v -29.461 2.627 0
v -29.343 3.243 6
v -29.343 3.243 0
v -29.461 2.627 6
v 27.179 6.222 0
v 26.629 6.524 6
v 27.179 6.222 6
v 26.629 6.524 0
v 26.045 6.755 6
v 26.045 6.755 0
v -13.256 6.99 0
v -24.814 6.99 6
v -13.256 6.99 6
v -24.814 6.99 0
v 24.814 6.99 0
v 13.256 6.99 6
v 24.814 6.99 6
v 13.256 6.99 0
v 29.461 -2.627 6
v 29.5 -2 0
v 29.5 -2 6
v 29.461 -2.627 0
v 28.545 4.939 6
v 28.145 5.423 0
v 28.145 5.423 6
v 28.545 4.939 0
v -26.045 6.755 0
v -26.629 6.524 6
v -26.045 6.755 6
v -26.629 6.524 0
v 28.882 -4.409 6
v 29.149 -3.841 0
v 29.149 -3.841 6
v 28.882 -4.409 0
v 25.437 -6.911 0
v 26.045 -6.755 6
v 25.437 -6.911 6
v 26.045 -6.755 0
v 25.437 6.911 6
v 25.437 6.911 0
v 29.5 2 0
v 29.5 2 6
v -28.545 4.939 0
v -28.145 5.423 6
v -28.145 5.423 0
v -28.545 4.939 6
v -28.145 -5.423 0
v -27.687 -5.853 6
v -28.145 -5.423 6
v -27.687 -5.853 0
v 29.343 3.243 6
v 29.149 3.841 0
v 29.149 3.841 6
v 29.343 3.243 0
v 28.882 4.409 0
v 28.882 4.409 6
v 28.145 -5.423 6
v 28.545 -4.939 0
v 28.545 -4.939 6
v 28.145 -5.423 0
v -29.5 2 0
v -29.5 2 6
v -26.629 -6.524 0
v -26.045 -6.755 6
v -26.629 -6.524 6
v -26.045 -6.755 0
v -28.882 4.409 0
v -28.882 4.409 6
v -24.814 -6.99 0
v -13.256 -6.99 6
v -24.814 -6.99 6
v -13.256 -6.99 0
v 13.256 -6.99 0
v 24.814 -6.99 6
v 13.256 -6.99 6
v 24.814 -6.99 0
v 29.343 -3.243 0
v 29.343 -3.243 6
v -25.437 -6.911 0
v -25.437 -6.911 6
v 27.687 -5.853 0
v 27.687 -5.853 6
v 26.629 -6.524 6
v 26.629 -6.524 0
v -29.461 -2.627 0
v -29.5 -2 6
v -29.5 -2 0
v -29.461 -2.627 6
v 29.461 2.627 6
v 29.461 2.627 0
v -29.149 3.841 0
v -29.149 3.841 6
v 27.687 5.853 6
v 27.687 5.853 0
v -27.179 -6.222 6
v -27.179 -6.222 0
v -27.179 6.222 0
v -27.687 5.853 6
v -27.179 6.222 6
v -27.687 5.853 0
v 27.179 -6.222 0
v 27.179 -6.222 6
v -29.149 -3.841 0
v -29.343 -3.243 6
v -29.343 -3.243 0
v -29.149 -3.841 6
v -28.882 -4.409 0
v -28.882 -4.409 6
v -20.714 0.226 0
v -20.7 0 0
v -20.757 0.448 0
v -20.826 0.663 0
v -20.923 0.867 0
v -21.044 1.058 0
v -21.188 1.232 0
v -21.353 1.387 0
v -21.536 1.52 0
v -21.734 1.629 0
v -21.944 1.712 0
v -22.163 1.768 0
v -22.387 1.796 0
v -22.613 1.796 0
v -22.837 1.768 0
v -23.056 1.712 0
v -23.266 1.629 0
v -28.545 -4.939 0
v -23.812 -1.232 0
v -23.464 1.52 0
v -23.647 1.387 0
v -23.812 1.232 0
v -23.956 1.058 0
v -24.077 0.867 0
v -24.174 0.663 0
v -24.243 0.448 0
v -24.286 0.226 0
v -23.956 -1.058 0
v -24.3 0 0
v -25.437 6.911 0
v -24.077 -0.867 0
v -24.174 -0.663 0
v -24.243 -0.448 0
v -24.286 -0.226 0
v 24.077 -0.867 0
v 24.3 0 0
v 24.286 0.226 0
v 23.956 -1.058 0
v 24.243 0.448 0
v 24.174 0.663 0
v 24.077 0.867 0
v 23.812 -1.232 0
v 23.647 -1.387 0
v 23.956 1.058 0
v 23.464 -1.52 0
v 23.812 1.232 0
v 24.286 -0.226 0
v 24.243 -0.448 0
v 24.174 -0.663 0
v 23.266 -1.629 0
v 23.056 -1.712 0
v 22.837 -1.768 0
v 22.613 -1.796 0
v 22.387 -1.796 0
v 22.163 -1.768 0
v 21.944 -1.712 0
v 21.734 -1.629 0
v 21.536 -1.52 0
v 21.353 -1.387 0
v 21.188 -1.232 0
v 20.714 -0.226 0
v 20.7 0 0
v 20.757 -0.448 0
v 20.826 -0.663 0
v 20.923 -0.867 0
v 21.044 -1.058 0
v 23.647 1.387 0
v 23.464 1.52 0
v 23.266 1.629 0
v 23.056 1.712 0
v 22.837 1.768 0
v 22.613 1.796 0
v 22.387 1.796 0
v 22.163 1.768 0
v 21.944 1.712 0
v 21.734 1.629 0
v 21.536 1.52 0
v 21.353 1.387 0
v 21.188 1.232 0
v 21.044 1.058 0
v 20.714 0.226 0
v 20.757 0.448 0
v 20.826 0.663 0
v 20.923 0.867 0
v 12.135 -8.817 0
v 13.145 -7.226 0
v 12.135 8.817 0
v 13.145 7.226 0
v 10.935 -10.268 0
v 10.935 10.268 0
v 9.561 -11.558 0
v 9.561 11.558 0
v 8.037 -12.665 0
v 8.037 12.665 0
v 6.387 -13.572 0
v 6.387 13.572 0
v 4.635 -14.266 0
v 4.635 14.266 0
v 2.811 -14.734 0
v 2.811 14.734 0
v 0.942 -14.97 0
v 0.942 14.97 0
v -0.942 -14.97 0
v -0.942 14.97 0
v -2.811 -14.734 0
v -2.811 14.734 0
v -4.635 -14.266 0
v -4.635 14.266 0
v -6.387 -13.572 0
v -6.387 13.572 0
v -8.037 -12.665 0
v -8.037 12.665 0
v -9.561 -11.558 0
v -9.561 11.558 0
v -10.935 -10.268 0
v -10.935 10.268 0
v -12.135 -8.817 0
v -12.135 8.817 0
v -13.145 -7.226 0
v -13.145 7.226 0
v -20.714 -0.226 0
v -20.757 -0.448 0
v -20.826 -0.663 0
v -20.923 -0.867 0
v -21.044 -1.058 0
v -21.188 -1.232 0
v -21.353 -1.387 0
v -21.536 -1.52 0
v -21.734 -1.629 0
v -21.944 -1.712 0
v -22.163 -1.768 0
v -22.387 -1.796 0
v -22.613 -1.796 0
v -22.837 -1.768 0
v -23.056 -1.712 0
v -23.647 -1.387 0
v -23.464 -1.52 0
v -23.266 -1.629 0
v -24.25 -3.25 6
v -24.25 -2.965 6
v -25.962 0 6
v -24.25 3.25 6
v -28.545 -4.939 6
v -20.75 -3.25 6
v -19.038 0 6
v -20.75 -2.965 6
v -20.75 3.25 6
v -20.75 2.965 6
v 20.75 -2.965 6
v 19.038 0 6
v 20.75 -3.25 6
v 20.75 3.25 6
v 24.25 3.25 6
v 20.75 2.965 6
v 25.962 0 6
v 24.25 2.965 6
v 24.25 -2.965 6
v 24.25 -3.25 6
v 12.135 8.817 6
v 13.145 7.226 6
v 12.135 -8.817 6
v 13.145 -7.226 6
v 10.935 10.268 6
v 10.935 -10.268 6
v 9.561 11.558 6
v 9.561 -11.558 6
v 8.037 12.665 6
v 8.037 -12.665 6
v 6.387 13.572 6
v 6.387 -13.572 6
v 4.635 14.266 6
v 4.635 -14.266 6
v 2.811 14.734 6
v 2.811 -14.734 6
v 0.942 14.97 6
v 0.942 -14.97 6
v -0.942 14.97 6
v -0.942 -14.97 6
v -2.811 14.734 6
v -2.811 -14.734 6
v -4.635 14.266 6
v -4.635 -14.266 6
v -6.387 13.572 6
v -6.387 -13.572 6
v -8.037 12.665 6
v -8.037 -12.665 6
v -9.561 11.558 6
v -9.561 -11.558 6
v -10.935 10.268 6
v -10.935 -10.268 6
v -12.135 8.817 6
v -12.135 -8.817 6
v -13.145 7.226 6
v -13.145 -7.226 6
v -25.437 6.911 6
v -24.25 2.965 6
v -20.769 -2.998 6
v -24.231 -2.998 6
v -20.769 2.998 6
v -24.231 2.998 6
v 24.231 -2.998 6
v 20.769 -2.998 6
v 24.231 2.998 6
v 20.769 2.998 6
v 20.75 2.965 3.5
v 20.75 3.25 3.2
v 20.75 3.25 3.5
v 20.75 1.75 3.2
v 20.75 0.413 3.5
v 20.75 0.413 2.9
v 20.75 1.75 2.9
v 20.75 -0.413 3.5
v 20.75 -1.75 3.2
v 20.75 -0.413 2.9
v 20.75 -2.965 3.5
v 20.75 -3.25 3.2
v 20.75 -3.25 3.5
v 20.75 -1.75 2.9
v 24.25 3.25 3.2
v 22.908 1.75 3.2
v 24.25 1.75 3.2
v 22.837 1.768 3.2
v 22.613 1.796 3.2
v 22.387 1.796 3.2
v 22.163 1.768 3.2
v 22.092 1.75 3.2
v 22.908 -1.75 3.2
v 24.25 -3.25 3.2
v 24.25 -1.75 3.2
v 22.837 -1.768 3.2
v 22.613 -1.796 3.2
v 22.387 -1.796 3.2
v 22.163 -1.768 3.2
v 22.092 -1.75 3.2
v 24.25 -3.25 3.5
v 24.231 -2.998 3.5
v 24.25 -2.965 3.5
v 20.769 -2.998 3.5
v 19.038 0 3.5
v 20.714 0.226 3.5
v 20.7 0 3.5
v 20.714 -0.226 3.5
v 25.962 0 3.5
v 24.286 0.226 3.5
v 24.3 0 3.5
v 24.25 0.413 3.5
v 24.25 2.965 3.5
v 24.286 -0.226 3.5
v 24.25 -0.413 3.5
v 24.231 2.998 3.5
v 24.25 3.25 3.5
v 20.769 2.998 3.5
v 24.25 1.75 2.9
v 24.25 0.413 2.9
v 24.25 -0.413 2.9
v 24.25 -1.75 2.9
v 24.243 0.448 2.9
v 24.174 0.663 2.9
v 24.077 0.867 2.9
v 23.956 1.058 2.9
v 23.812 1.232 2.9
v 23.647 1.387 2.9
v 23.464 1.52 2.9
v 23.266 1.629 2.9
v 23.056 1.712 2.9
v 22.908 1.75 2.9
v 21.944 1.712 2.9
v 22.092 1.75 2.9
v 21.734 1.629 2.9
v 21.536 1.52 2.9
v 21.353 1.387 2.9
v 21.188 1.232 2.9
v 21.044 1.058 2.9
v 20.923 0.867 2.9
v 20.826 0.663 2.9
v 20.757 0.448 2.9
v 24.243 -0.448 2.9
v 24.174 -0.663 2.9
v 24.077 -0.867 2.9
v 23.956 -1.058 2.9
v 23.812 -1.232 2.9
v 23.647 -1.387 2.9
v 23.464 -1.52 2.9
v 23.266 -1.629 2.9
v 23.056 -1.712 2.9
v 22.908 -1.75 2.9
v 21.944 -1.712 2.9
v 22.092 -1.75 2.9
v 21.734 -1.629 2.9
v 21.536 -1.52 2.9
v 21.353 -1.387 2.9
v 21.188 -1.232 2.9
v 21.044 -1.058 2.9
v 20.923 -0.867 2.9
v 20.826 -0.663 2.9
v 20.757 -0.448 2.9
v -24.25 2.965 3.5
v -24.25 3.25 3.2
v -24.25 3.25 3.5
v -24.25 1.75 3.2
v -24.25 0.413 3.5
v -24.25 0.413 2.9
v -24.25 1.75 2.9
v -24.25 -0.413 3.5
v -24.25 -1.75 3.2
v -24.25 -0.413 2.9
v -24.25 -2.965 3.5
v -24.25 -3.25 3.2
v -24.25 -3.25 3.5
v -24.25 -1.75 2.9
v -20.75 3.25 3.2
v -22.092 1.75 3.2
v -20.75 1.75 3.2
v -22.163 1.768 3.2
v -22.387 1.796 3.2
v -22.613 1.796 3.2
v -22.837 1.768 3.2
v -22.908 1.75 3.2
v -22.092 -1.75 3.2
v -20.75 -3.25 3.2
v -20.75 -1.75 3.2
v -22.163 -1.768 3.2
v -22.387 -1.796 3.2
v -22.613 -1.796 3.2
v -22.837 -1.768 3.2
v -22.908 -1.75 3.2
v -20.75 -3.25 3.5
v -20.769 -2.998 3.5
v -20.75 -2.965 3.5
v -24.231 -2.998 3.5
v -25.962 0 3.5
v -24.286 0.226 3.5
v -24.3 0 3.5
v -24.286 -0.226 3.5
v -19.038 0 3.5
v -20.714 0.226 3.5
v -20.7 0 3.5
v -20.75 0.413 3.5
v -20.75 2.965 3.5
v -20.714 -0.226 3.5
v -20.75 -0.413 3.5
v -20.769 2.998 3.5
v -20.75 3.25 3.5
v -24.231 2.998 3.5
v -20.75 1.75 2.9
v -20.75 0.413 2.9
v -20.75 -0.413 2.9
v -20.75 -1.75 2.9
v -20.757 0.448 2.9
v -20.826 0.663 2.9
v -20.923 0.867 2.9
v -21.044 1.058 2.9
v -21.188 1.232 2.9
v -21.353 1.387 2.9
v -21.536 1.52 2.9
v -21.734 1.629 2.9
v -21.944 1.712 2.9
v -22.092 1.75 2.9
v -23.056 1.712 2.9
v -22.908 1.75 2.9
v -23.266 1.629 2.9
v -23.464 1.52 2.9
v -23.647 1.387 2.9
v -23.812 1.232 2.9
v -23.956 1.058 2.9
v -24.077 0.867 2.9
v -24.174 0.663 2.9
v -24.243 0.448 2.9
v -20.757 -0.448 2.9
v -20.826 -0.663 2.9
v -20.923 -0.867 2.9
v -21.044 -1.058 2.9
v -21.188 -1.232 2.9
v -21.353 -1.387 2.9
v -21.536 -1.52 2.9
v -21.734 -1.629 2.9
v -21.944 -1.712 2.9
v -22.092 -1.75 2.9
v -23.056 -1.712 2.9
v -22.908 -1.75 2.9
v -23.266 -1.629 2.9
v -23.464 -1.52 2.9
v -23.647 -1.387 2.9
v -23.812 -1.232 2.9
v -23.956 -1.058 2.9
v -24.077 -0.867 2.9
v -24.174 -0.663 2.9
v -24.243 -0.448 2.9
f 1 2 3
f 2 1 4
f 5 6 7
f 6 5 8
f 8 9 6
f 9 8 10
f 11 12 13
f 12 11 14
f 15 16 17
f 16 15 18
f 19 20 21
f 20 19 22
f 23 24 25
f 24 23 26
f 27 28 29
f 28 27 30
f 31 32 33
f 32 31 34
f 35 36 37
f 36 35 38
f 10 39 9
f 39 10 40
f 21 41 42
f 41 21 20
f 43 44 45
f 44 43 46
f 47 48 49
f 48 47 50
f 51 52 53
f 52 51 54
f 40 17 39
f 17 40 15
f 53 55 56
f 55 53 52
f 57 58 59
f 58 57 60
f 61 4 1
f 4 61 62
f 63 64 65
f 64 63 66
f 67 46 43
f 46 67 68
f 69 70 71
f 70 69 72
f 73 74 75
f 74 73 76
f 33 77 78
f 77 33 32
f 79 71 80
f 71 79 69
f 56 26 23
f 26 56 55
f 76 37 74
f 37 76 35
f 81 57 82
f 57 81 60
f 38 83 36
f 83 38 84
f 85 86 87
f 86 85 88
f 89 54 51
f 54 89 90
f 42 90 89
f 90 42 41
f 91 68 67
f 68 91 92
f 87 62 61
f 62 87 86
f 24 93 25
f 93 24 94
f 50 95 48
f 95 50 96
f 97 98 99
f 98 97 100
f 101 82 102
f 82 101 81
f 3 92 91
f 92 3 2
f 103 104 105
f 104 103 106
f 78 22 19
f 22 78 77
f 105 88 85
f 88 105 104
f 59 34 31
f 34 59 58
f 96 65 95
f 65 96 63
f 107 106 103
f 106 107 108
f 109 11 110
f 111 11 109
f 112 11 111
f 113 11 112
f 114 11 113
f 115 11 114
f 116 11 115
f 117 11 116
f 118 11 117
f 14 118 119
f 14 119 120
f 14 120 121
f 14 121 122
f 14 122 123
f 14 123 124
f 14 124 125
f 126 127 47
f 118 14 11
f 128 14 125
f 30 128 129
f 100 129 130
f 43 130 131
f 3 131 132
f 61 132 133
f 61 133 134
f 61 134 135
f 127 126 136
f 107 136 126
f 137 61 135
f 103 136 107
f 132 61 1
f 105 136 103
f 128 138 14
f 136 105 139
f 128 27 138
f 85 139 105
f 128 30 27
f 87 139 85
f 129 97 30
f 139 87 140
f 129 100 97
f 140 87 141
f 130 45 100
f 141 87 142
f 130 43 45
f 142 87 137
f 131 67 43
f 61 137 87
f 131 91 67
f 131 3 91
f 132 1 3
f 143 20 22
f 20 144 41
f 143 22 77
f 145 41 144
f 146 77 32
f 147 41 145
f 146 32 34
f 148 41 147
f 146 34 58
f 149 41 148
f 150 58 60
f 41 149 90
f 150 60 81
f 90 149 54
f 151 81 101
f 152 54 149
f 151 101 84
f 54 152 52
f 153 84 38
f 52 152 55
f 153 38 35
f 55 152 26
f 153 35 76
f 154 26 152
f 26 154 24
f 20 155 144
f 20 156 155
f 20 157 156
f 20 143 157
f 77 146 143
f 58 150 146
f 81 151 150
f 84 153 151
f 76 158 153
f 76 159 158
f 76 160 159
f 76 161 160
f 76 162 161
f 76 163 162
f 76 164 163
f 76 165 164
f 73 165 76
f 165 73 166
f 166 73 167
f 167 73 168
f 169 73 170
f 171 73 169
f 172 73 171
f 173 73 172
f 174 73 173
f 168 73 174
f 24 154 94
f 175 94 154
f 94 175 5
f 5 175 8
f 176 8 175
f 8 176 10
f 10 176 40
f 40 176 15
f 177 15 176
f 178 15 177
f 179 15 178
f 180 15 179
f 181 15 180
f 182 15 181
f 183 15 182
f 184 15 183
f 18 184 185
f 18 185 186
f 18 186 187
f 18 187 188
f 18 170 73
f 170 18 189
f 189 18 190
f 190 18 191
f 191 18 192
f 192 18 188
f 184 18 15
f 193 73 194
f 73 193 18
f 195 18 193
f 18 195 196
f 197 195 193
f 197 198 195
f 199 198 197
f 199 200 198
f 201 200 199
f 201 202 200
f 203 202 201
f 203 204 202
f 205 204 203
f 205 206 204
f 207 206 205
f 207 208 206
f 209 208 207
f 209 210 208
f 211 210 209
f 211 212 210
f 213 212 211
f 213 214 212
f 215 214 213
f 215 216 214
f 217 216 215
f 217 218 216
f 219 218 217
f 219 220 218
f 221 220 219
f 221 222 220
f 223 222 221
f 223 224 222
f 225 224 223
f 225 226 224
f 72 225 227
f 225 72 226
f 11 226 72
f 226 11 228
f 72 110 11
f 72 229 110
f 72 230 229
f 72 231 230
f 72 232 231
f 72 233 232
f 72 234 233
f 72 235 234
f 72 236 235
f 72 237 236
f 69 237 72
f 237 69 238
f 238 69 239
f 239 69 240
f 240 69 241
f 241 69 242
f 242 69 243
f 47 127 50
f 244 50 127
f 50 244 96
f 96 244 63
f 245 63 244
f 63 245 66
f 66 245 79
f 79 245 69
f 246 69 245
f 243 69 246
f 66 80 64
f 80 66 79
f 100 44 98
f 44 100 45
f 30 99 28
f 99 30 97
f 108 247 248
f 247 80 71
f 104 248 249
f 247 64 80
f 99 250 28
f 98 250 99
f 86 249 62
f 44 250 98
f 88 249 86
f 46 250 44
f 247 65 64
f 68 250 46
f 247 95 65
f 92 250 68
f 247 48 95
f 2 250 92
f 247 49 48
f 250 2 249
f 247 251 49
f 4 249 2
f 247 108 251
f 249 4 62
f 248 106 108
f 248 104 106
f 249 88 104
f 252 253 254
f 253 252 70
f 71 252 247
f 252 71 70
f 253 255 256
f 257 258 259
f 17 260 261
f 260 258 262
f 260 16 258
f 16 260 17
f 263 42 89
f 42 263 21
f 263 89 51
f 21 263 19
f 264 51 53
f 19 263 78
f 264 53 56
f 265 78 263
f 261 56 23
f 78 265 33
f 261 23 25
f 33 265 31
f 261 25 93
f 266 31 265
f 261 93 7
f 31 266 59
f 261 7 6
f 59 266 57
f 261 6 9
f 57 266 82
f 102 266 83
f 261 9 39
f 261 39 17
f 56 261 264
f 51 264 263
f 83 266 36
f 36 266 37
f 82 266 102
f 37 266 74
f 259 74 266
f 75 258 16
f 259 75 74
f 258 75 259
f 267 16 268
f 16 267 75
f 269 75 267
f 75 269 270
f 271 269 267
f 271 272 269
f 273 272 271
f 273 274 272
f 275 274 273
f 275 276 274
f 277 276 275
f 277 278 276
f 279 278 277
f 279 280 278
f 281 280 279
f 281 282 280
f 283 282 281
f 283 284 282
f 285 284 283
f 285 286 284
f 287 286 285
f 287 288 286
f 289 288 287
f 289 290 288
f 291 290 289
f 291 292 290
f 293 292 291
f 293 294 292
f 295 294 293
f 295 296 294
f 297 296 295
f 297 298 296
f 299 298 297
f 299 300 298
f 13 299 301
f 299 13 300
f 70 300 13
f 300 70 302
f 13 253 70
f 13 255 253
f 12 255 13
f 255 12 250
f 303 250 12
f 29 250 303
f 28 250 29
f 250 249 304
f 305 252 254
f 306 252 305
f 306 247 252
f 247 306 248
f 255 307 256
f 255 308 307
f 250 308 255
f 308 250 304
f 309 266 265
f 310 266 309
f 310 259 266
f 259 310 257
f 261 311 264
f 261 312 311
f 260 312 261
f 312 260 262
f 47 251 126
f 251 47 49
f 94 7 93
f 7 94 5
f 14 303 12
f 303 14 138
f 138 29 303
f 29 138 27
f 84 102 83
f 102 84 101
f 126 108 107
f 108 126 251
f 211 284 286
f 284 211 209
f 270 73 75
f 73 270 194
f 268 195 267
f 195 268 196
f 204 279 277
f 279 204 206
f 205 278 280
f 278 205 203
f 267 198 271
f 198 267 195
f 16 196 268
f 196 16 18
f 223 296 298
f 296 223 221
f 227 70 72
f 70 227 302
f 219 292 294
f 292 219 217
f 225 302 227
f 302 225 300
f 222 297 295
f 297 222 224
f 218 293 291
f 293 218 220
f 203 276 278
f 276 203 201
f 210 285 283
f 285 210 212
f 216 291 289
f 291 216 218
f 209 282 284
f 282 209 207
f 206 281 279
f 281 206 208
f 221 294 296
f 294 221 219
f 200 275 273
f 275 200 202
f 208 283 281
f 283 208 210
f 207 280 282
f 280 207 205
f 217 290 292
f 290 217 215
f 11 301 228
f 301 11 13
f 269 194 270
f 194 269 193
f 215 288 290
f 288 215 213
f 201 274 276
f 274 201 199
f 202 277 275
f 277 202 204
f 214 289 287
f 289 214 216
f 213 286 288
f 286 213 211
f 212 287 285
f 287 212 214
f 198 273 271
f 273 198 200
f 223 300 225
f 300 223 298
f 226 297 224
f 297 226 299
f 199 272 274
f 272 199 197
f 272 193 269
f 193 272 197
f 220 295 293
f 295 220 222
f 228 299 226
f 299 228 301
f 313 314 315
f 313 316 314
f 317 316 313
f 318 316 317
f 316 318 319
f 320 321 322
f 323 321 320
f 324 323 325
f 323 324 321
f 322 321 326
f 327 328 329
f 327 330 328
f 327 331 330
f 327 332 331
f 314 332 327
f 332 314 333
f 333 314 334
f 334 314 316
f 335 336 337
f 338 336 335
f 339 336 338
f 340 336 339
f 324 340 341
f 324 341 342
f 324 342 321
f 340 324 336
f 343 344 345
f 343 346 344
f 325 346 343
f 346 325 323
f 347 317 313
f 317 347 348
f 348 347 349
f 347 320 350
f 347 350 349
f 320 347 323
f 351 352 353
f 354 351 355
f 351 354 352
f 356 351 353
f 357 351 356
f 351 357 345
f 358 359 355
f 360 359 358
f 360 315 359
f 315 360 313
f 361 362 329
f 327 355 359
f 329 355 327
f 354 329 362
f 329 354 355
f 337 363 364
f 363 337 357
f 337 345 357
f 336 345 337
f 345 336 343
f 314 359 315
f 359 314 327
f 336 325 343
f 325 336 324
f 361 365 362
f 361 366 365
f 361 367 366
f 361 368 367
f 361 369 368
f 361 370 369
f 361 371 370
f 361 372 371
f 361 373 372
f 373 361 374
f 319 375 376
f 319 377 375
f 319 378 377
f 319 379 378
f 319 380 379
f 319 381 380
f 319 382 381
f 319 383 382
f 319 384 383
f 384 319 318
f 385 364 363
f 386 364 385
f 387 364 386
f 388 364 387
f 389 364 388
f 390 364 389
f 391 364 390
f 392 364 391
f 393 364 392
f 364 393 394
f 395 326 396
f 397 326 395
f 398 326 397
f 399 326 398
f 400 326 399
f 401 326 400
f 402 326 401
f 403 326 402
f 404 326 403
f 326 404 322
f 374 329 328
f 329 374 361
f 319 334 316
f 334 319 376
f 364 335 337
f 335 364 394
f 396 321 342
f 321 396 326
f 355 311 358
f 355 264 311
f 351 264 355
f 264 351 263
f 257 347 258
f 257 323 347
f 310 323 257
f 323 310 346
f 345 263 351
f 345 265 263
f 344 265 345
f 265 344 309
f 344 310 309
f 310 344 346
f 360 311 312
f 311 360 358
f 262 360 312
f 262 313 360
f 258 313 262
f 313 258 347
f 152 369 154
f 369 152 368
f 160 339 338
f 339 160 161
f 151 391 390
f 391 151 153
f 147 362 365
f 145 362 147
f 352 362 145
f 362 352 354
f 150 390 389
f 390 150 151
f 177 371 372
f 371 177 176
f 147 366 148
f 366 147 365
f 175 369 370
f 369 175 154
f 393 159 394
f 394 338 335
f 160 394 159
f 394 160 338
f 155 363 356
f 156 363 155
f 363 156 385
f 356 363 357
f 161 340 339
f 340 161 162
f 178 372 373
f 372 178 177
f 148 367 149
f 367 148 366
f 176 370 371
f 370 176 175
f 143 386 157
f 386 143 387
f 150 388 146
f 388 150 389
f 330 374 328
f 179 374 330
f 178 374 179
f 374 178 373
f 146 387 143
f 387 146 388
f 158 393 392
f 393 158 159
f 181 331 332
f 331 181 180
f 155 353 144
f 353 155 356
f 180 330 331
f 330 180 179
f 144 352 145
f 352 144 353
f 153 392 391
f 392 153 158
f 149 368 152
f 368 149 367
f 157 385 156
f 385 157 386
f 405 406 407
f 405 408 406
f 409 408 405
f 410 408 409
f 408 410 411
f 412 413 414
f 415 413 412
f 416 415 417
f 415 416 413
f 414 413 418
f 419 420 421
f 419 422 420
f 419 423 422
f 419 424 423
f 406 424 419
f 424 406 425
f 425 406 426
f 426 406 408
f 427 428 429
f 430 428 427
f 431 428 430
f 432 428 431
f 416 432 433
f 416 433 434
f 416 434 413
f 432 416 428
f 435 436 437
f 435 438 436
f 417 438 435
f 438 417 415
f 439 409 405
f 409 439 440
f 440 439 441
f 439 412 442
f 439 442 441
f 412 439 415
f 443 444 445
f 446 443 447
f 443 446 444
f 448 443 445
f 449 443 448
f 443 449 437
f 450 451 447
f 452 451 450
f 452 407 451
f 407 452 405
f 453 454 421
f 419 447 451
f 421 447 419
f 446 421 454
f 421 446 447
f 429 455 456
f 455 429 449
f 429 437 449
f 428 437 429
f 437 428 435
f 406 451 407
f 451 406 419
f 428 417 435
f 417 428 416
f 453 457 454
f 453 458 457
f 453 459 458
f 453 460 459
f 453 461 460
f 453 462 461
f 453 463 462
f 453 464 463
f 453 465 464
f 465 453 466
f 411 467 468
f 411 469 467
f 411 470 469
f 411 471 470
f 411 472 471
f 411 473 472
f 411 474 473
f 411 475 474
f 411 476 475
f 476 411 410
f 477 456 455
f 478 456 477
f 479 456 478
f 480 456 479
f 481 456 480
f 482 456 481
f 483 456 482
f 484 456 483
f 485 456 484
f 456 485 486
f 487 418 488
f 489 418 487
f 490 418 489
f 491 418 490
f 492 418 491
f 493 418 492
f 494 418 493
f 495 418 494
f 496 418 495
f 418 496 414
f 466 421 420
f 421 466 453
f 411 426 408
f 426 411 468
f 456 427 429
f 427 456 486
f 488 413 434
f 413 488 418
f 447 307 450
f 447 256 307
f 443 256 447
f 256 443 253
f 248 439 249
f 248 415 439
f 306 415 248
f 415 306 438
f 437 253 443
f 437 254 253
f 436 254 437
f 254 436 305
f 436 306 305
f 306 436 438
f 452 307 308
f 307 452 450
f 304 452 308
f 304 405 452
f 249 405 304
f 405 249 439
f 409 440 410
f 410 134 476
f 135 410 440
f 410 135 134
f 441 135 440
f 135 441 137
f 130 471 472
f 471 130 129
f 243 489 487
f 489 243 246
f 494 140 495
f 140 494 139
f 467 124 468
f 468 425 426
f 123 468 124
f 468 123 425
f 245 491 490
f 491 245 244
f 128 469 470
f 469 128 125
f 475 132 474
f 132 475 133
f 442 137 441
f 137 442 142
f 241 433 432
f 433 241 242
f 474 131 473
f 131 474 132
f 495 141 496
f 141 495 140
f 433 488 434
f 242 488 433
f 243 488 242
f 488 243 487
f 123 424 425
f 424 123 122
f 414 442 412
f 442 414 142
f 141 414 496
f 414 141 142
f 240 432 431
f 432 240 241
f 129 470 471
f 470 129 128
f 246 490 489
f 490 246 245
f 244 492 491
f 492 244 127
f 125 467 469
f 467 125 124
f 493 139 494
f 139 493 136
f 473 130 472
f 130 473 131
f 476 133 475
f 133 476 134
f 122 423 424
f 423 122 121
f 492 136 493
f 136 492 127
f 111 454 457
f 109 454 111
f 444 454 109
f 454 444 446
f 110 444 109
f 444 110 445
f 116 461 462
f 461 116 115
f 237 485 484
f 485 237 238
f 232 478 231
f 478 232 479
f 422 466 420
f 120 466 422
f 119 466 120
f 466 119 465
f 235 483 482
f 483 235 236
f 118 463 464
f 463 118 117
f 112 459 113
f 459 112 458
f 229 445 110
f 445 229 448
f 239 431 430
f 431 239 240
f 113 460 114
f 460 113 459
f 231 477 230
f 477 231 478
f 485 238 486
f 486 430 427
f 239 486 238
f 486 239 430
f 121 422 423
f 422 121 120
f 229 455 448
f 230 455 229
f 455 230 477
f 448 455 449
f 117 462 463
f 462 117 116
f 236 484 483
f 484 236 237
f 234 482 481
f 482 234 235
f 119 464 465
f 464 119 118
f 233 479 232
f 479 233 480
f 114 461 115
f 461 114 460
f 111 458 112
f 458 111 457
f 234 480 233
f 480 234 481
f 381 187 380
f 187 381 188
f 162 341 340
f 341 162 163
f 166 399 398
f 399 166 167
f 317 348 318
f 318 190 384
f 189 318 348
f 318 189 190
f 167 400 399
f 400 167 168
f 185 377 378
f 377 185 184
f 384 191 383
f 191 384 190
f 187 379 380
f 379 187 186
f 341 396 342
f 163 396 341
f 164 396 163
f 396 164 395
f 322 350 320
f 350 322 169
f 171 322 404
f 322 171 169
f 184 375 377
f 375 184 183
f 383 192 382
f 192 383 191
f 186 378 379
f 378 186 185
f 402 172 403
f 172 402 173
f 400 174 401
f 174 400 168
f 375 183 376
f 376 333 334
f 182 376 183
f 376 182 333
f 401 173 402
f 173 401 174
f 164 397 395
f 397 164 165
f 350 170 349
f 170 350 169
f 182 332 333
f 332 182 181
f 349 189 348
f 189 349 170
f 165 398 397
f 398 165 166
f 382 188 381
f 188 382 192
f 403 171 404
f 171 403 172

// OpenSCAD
$fn = 50;


difference() {
	union() {
		hull() {
			translate(v = [-24.5000000000, 2.0000000000, 0]) {
				cylinder(h = 6, r = 5);
			}
			translate(v = [24.5000000000, 2.0000000000, 0]) {
				cylinder(h = 6, r = 5);
			}
			translate(v = [-24.5000000000, -2.0000000000, 0]) {
				cylinder(h = 6, r = 5);
			}
			translate(v = [24.5000000000, -2.0000000000, 0]) {
				cylinder(h = 6, r = 5);
			}
		}
		cylinder(h = 6, r = 15);
	}
	union() {
		translate(v = [22.5000000000, 0, -20]) {
			rotate(a = [0, 180, 0]) {
				difference() {
					union() {
						translate(v = [0, 0, -26.0000000000]) {
							rotate(a = [0, 0, 0]) {
								difference() {
									union() {
										#translate(v = [-1.7500000000, -3.2500000000, -0.3000000000]) {
											cube(size = [3.5000000000, 6.5000000000, 0.3000000000]);
										}
										#translate(v = [-1.7500000000, -1.7500000000, -0.6000000000]) {
											cube(size = [3.5000000000, 3.5000000000, 0.3000000000]);
										}
										#translate(v = [-1.7500000000, -3.2500000000, 2.5000000000]) {
											cube(size = [3.5000000000, 6.5000000000, 0.3000000000]);
										}
										#translate(v = [-1.7500000000, -1.7500000000, 2.8000000000]) {
											cube(size = [3.5000000000, 3.5000000000, 0.3000000000]);
										}
										#linear_extrude(height = 2.5000000000) {
											polygon(points = [[3.4620000000, 0.0000000000], [1.7310000000, 2.9981799479], [-1.7310000000, 2.9981799479], [-3.4620000000, 0.0000000000], [-1.7310000000, -2.9981799479], [1.7310000000, -2.9981799479]]);
										}
										#translate(v = [-1.7500000000, -3.2500000000, -0.3000000000]) {
											cube(size = [3.5000000000, 6.5000000000, 0.3000000000]);
										}
										#translate(v = [-1.7500000000, -1.7500000000, -0.6000000000]) {
											cube(size = [3.5000000000, 3.5000000000, 0.3000000000]);
										}
										#translate(v = [-1.7500000000, -3.2500000000, 2.5000000000]) {
											cube(size = [3.5000000000, 6.5000000000, 0.3000000000]);
										}
										#translate(v = [-1.7500000000, -1.7500000000, 2.8000000000]) {
											cube(size = [3.5000000000, 3.5000000000, 0.3000000000]);
										}
										#translate(v = [-1.7500000000, -3.2500000000, -0.3000000000]) {
											cube(size = [3.5000000000, 6.5000000000, 0.3000000000]);
										}
										#translate(v = [-1.7500000000, -1.7500000000, -0.6000000000]) {
											cube(size = [3.5000000000, 3.5000000000, 0.3000000000]);
										}
										#translate(v = [-1.7500000000, -3.2500000000, 2.5000000000]) {
											cube(size = [3.5000000000, 6.5000000000, 0.3000000000]);
										}
										#translate(v = [-1.7500000000, -1.7500000000, 2.8000000000]) {
											cube(size = [3.5000000000, 3.5000000000, 0.3000000000]);
										}
									}
									union();
								}
							}
						}
						translate(v = [0, 0, -26.0000000000]) {
							rotate(a = [0, 0, 0]) {
								difference() {
									union() {
										#translate(v = [-1.7500000000, -3.2500000000, -0.3000000000]) {
											cube(size = [3.5000000000, 6.5000000000, 0.3000000000]);
										}
										#translate(v = [-1.7500000000, -1.7500000000, -0.6000000000]) {
											cube(size = [3.5000000000, 3.5000000000, 0.3000000000]);
										}
										#translate(v = [-1.7500000000, -3.2500000000, 2.5000000000]) {
											cube(size = [3.5000000000, 6.5000000000, 0.3000000000]);
										}
										#translate(v = [-1.7500000000, -1.7500000000, 2.8000000000]) {
											cube(size = [3.5000000000, 3.5000000000, 0.3000000000]);
										}
										#linear_extrude(height = 2.5000000000) {
											polygon(points = [[3.4620000000, 0.0000000000], [1.7310000000, 2.9981799479], [-1.7310000000, 2.9981799479], [-3.4620000000, 0.0000000000], [-1.7310000000, -2.9981799479], [1.7310000000, -2.9981799479]]);
										}
										#translate(v = [-1.7500000000, -3.2500000000, -0.3000000000]) {
											cube(size = [3.5000000000, 6.5000000000, 0.3000000000]);
										}
										#translate(v = [-1.7500000000, -1.7500000000, -0.6000000000]) {
											cube(size = [3.5000000000, 3.5000000000, 0.3000000000]);
										}
										#translate(v = [-1.7500000000, -3.2500000000, 2.5000000000]) {
											cube(size = [3.5000000000, 6.5000000000, 0.3000000000]);
										}
										#translate(v = [-1.7500000000, -1.7500000000, 2.8000000000]) {
											cube(size = [3.5000000000, 3.5000000000, 0.3000000000]);
										}
										#translate(v = [-1.7500000000, -3.2500000000, -0.3000000000]) {
											cube(size = [3.5000000000, 6.5000000000, 0.3000000000]);
										}
										#translate(v = [-1.7500000000, -1.7500000000, -0.6000000000]) {
											cube(size = [3.5000000000, 3.5000000000, 0.3000000000]);
										}
										#translate(v = [-1.7500000000, -3.2500000000, 2.5000000000]) {
											cube(size = [3.5000000000, 6.5000000000, 0.3000000000]);
										}
										#translate(v = [-1.7500000000, -1.7500000000, 2.8000000000]) {
											cube(size = [3.5000000000, 3.5000000000, 0.3000000000]);
										}
									}
									union();
								}
							}
						}
						translate(v = [0, 0, -26.0000000000]) {
							rotate(a = [0, 0, 0]) {
								difference() {
									union() {
										#translate(v = [-1.7500000000, -3.2500000000, -0.3000000000]) {
											cube(size = [3.5000000000, 6.5000000000, 0.3000000000]);
										}
										#translate(v = [-1.7500000000, -1.7500000000, -0.6000000000]) {
											cube(size = [3.5000000000, 3.5000000000, 0.3000000000]);
										}
										#translate(v = [-1.7500000000, -3.2500000000, 2.5000000000]) {
											cube(size = [3.5000000000, 6.5000000000, 0.3000000000]);
										}
										#translate(v = [-1.7500000000, -1.7500000000, 2.8000000000]) {
											cube(size = [3.5000000000, 3.5000000000, 0.3000000000]);
										}
										#linear_extrude(height = 2.5000000000) {
											polygon(points = [[3.4620000000, 0.0000000000], [1.7310000000, 2.9981799479], [-1.7310000000, 2.9981799479], [-3.4620000000, 0.0000000000], [-1.7310000000, -2.9981799479], [1.7310000000, -2.9981799479]]);
										}
										#translate(v = [-1.7500000000, -3.2500000000, -0.3000000000]) {
											cube(size = [3.5000000000, 6.5000000000, 0.3000000000]);
										}
										#translate(v = [-1.7500000000, -1.7500000000, -0.6000000000]) {
											cube(size = [3.5000000000, 3.5000000000, 0.3000000000]);
										}
										#translate(v = [-1.7500000000, -3.2500000000, 2.5000000000]) {
											cube(size = [3.5000000000, 6.5000000000, 0.3000000000]);
										}
										#translate(v = [-1.7500000000, -1.7500000000, 2.8000000000]) {
											cube(size = [3.5000000000, 3.5000000000, 0.3000000000]);
										}
										#translate(v = [-1.7500000000, -3.2500000000, -0.3000000000]) {
											cube(size = [3.5000000000, 6.5000000000, 0.3000000000]);
										}
										#translate(v = [-1.7500000000, -1.7500000000, -0.6000000000]) {
											cube(size = [3.5000000000, 3.5000000000, 0.3000000000]);
										}
										#translate(v = [-1.7500000000, -3.2500000000, 2.5000000000]) {
											cube(size = [3.5000000000, 6.5000000000, 0.3000000000]);
										}
										#translate(v = [-1.7500000000, -1.7500000000, 2.8000000000]) {
											cube(size = [3.5000000000, 3.5000000000, 0.3000000000]);
										}
									}
									union();
								}
							}
						}
						#translate(v = [0, 0, -26.0000000000]) {
							cylinder(h = 26, r = 1.5000000000);
						}
						#translate(v = [0, 0, -1.9000000000]) {
							cylinder(h = 1.9000000000, r1 = 1.8000000000, r2 = 3.6000000000);
						}
						#translate(v = [0, 0, -26.0000000000]) {
							cylinder(h = 26, r = 1.8000000000);
						}
						#translate(v = [0, 0, -26.0000000000]) {
							cylinder(h = 26, r = 1.5000000000);
						}
					}
					union();
				}
			}
		}
		translate(v = [-22.5000000000, 0, -20]) {
			rotate(a = [0, 180, 0]) {
				difference() {
					union() {
						translate(v = [0, 0, -26.0000000000]) {
							rotate(a = [0, 0, 0]) {
								difference() {
									union() {
										#translate(v = [-1.7500000000, -3.2500000000, -0.3000000000]) {
											cube(size = [3.5000000000, 6.5000000000, 0.3000000000]);
										}
										#translate(v = [-1.7500000000, -1.7500000000, -0.6000000000]) {
											cube(size = [3.5000000000, 3.5000000000, 0.3000000000]);
										}
										#translate(v = [-1.7500000000, -3.2500000000, 2.5000000000]) {
											cube(size = [3.5000000000, 6.5000000000, 0.3000000000]);
										}
										#translate(v = [-1.7500000000, -1.7500000000, 2.8000000000]) {
											cube(size = [3.5000000000, 3.5000000000, 0.3000000000]);
										}
										#linear_extrude(height = 2.5000000000) {
											polygon(points = [[3.4620000000, 0.0000000000], [1.7310000000, 2.9981799479], [-1.7310000000, 2.9981799479], [-3.4620000000, 0.0000000000], [-1.7310000000, -2.9981799479], [1.7310000000, -2.9981799479]]);
										}
										#translate(v = [-1.7500000000, -3.2500000000, -0.3000000000]) {
											cube(size = [3.5000000000, 6.5000000000, 0.3000000000]);
										}
										#translate(v = [-1.7500000000, -1.7500000000, -0.6000000000]) {
											cube(size = [3.5000000000, 3.5000000000, 0.3000000000]);
										}
										#translate(v = [-1.7500000000, -3.2500000000, 2.5000000000]) {
											cube(size = [3.5000000000, 6.5000000000, 0.3000000000]);
										}
										#translate(v = [-1.7500000000, -1.7500000000, 2.8000000000]) {
											cube(size = [3.5000000000, 3.5000000000, 0.3000000000]);
										}
										#translate(v = [-1.7500000000, -3.2500000000, -0.3000000000]) {
											cube(size = [3.5000000000, 6.5000000000, 0.3000000000]);
										}
										#translate(v = [-1.7500000000, -1.7500000000, -0.6000000000]) {
											cube(size = [3.5000000000, 3.5000000000, 0.3000000000]);
										}
										#translate(v = [-1.7500000000, -3.2500000000, 2.5000000000]) {
											cube(size = [3.5000000000, 6.5000000000, 0.3000000000]);
										}
										#translate(v = [-1.7500000000, -1.7500000000, 2.8000000000]) {
											cube(size = [3.5000000000, 3.5000000000, 0.3000000000]);
										}
									}
									union();
								}
							}
						}
						translate(v = [0, 0, -26.0000000000]) {
							rotate(a = [0, 0, 0]) {
								difference() {
									union() {
										#translate(v = [-1.7500000000, -3.2500000000, -0.3000000000]) {
											cube(size = [3.5000000000, 6.5000000000, 0.3000000000]);
										}
										#translate(v = [-1.7500000000, -1.7500000000, -0.6000000000]) {
											cube(size = [3.5000000000, 3.5000000000, 0.3000000000]);
										}
										#translate(v = [-1.7500000000, -3.2500000000, 2.5000000000]) {
											cube(size = [3.5000000000, 6.5000000000, 0.3000000000]);
										}
										#translate(v = [-1.7500000000, -1.7500000000, 2.8000000000]) {
											cube(size = [3.5000000000, 3.5000000000, 0.3000000000]);
										}
										#linear_extrude(height = 2.5000000000) {
											polygon(points = [[3.4620000000, 0.0000000000], [1.7310000000, 2.9981799479], [-1.7310000000, 2.9981799479], [-3.4620000000, 0.0000000000], [-1.7310000000, -2.9981799479], [1.7310000000, -2.9981799479]]);
										}
										#translate(v = [-1.7500000000, -3.2500000000, -0.3000000000]) {
											cube(size = [3.5000000000, 6.5000000000, 0.3000000000]);
										}
										#translate(v = [-1.7500000000, -1.7500000000, -0.6000000000]) {
											cube(size = [3.5000000000, 3.5000000000, 0.3000000000]);
										}
										#translate(v = [-1.7500000000, -3.2500000000, 2.5000000000]) {
											cube(size = [3.5000000000, 6.5000000000, 0.3000000000]);
										}
										#translate(v = [-1.7500000000, -1.7500000000, 2.8000000000]) {
											cube(size = [3.5000000000, 3.5000000000, 0.3000000000]);
										}
										#translate(v = [-1.7500000000, -3.2500000000, -0.3000000000]) {
											cube(size = [3.5000000000, 6.5000000000, 0.3000000000]);
										}
										#translate(v = [-1.7500000000, -1.7500000000, -0.6000000000]) {
											cube(size = [3.5000000000, 3.5000000000, 0.3000000000]);
										}
										#translate(v = [-1.7500000000, -3.2500000000, 2.5000000000]) {
											cube(size = [3.5000000000, 6.5000000000, 0.3000000000]);
										}
										#translate(v = [-1.7500000000, -1.7500000000, 2.8000000000]) {
											cube(size = [3.5000000000, 3.5000000000, 0.3000000000]);
										}
									}
									union();
								}
							}
						}
						translate(v = [0, 0, -26.0000000000]) {
							rotate(a = [0, 0, 0]) {
								difference() {
									union() {
										#translate(v = [-1.7500000000, -3.2500000000, -0.3000000000]) {
											cube(size = [3.5000000000, 6.5000000000, 0.3000000000]);
										}
										#translate(v = [-1.7500000000, -1.7500000000, -0.6000000000]) {
											cube(size = [3.5000000000, 3.5000000000, 0.3000000000]);
										}
										#translate(v = [-1.7500000000, -3.2500000000, 2.5000000000]) {
											cube(size = [3.5000000000, 6.5000000000, 0.3000000000]);
										}
										#translate(v = [-1.7500000000, -1.7500000000, 2.8000000000]) {
											cube(size = [3.5000000000, 3.5000000000, 0.3000000000]);
										}
										#linear_extrude(height = 2.5000000000) {
											polygon(points = [[3.4620000000, 0.0000000000], [1.7310000000, 2.9981799479], [-1.7310000000, 2.9981799479], [-3.4620000000, 0.0000000000], [-1.7310000000, -2.9981799479], [1.7310000000, -2.9981799479]]);
										}
										#translate(v = [-1.7500000000, -3.2500000000, -0.3000000000]) {
											cube(size = [3.5000000000, 6.5000000000, 0.3000000000]);
										}
										#translate(v = [-1.7500000000, -1.7500000000, -0.6000000000]) {
											cube(size = [3.5000000000, 3.5000000000, 0.3000000000]);
										}
										#translate(v = [-1.7500000000, -3.2500000000, 2.5000000000]) {
											cube(size = [3.5000000000, 6.5000000000, 0.3000000000]);
										}
										#translate(v = [-1.7500000000, -1.7500000000, 2.8000000000]) {
											cube(size = [3.5000000000, 3.5000000000, 0.3000000000]);
										}
										#translate(v = [-1.7500000000, -3.2500000000, -0.3000000000]) {
											cube(size = [3.5000000000, 6.5000000000, 0.3000000000]);
										}
										#translate(v = [-1.7500000000, -1.7500000000, -0.6000000000]) {
											cube(size = [3.5000000000, 3.5000000000, 0.3000000000]);
										}
										#translate(v = [-1.7500000000, -3.2500000000, 2.5000000000]) {
											cube(size = [3.5000000000, 6.5000000000, 0.3000000000]);
										}
										#translate(v = [-1.7500000000, -1.7500000000, 2.8000000000]) {
											cube(size = [3.5000000000, 3.5000000000, 0.3000000000]);
										}
									}
									union();
								}
							}
						}
						#translate(v = [0, 0, -26.0000000000]) {
							cylinder(h = 26, r = 1.5000000000);
						}
						#translate(v = [0, 0, -1.9000000000]) {
							cylinder(h = 1.9000000000, r1 = 1.8000000000, r2 = 3.6000000000);
						}
						#translate(v = [0, 0, -26.0000000000]) {
							cylinder(h = 26, r = 1.8000000000);
						}
						#translate(v = [0, 0, -26.0000000000]) {
							cylinder(h = 26, r = 1.5000000000);
						}
					}
					union();
				}
			}
		}
		translate(v = [-22.5000000000, 0.0000000000, 0]) {
			cylinder(h = 6, r = 1.8000000000);
		}
		translate(v = [22.5000000000, 0.0000000000, 0]) {
			cylinder(h = 6, r = 1.8000000000);
		}
		translate(v = [-22.5000000000, 0.0000000000, 0]) {
			cylinder(h = 6, r = 1.8000000000);
		}
		translate(v = [22.5000000000, 0.0000000000, 0]) {
			cylinder(h = 6, r = 1.8000000000);
		}
		translate(v = [-22.5000000000, 0.0000000000, 0]) {
			cylinder(h = 6, r = 1.8000000000);
		}
		translate(v = [22.5000000000, 0.0000000000, 0]) {
			cylinder(h = 6, r = 1.8000000000);
		}
		translate(v = [-22.5000000000, 0.0000000000, 0]) {
			cylinder(h = 6, r = 1.8000000000);
		}
		translate(v = [22.5000000000, 0.0000000000, 0]) {
			cylinder(h = 6, r = 1.8000000000);
		}
	}
}
